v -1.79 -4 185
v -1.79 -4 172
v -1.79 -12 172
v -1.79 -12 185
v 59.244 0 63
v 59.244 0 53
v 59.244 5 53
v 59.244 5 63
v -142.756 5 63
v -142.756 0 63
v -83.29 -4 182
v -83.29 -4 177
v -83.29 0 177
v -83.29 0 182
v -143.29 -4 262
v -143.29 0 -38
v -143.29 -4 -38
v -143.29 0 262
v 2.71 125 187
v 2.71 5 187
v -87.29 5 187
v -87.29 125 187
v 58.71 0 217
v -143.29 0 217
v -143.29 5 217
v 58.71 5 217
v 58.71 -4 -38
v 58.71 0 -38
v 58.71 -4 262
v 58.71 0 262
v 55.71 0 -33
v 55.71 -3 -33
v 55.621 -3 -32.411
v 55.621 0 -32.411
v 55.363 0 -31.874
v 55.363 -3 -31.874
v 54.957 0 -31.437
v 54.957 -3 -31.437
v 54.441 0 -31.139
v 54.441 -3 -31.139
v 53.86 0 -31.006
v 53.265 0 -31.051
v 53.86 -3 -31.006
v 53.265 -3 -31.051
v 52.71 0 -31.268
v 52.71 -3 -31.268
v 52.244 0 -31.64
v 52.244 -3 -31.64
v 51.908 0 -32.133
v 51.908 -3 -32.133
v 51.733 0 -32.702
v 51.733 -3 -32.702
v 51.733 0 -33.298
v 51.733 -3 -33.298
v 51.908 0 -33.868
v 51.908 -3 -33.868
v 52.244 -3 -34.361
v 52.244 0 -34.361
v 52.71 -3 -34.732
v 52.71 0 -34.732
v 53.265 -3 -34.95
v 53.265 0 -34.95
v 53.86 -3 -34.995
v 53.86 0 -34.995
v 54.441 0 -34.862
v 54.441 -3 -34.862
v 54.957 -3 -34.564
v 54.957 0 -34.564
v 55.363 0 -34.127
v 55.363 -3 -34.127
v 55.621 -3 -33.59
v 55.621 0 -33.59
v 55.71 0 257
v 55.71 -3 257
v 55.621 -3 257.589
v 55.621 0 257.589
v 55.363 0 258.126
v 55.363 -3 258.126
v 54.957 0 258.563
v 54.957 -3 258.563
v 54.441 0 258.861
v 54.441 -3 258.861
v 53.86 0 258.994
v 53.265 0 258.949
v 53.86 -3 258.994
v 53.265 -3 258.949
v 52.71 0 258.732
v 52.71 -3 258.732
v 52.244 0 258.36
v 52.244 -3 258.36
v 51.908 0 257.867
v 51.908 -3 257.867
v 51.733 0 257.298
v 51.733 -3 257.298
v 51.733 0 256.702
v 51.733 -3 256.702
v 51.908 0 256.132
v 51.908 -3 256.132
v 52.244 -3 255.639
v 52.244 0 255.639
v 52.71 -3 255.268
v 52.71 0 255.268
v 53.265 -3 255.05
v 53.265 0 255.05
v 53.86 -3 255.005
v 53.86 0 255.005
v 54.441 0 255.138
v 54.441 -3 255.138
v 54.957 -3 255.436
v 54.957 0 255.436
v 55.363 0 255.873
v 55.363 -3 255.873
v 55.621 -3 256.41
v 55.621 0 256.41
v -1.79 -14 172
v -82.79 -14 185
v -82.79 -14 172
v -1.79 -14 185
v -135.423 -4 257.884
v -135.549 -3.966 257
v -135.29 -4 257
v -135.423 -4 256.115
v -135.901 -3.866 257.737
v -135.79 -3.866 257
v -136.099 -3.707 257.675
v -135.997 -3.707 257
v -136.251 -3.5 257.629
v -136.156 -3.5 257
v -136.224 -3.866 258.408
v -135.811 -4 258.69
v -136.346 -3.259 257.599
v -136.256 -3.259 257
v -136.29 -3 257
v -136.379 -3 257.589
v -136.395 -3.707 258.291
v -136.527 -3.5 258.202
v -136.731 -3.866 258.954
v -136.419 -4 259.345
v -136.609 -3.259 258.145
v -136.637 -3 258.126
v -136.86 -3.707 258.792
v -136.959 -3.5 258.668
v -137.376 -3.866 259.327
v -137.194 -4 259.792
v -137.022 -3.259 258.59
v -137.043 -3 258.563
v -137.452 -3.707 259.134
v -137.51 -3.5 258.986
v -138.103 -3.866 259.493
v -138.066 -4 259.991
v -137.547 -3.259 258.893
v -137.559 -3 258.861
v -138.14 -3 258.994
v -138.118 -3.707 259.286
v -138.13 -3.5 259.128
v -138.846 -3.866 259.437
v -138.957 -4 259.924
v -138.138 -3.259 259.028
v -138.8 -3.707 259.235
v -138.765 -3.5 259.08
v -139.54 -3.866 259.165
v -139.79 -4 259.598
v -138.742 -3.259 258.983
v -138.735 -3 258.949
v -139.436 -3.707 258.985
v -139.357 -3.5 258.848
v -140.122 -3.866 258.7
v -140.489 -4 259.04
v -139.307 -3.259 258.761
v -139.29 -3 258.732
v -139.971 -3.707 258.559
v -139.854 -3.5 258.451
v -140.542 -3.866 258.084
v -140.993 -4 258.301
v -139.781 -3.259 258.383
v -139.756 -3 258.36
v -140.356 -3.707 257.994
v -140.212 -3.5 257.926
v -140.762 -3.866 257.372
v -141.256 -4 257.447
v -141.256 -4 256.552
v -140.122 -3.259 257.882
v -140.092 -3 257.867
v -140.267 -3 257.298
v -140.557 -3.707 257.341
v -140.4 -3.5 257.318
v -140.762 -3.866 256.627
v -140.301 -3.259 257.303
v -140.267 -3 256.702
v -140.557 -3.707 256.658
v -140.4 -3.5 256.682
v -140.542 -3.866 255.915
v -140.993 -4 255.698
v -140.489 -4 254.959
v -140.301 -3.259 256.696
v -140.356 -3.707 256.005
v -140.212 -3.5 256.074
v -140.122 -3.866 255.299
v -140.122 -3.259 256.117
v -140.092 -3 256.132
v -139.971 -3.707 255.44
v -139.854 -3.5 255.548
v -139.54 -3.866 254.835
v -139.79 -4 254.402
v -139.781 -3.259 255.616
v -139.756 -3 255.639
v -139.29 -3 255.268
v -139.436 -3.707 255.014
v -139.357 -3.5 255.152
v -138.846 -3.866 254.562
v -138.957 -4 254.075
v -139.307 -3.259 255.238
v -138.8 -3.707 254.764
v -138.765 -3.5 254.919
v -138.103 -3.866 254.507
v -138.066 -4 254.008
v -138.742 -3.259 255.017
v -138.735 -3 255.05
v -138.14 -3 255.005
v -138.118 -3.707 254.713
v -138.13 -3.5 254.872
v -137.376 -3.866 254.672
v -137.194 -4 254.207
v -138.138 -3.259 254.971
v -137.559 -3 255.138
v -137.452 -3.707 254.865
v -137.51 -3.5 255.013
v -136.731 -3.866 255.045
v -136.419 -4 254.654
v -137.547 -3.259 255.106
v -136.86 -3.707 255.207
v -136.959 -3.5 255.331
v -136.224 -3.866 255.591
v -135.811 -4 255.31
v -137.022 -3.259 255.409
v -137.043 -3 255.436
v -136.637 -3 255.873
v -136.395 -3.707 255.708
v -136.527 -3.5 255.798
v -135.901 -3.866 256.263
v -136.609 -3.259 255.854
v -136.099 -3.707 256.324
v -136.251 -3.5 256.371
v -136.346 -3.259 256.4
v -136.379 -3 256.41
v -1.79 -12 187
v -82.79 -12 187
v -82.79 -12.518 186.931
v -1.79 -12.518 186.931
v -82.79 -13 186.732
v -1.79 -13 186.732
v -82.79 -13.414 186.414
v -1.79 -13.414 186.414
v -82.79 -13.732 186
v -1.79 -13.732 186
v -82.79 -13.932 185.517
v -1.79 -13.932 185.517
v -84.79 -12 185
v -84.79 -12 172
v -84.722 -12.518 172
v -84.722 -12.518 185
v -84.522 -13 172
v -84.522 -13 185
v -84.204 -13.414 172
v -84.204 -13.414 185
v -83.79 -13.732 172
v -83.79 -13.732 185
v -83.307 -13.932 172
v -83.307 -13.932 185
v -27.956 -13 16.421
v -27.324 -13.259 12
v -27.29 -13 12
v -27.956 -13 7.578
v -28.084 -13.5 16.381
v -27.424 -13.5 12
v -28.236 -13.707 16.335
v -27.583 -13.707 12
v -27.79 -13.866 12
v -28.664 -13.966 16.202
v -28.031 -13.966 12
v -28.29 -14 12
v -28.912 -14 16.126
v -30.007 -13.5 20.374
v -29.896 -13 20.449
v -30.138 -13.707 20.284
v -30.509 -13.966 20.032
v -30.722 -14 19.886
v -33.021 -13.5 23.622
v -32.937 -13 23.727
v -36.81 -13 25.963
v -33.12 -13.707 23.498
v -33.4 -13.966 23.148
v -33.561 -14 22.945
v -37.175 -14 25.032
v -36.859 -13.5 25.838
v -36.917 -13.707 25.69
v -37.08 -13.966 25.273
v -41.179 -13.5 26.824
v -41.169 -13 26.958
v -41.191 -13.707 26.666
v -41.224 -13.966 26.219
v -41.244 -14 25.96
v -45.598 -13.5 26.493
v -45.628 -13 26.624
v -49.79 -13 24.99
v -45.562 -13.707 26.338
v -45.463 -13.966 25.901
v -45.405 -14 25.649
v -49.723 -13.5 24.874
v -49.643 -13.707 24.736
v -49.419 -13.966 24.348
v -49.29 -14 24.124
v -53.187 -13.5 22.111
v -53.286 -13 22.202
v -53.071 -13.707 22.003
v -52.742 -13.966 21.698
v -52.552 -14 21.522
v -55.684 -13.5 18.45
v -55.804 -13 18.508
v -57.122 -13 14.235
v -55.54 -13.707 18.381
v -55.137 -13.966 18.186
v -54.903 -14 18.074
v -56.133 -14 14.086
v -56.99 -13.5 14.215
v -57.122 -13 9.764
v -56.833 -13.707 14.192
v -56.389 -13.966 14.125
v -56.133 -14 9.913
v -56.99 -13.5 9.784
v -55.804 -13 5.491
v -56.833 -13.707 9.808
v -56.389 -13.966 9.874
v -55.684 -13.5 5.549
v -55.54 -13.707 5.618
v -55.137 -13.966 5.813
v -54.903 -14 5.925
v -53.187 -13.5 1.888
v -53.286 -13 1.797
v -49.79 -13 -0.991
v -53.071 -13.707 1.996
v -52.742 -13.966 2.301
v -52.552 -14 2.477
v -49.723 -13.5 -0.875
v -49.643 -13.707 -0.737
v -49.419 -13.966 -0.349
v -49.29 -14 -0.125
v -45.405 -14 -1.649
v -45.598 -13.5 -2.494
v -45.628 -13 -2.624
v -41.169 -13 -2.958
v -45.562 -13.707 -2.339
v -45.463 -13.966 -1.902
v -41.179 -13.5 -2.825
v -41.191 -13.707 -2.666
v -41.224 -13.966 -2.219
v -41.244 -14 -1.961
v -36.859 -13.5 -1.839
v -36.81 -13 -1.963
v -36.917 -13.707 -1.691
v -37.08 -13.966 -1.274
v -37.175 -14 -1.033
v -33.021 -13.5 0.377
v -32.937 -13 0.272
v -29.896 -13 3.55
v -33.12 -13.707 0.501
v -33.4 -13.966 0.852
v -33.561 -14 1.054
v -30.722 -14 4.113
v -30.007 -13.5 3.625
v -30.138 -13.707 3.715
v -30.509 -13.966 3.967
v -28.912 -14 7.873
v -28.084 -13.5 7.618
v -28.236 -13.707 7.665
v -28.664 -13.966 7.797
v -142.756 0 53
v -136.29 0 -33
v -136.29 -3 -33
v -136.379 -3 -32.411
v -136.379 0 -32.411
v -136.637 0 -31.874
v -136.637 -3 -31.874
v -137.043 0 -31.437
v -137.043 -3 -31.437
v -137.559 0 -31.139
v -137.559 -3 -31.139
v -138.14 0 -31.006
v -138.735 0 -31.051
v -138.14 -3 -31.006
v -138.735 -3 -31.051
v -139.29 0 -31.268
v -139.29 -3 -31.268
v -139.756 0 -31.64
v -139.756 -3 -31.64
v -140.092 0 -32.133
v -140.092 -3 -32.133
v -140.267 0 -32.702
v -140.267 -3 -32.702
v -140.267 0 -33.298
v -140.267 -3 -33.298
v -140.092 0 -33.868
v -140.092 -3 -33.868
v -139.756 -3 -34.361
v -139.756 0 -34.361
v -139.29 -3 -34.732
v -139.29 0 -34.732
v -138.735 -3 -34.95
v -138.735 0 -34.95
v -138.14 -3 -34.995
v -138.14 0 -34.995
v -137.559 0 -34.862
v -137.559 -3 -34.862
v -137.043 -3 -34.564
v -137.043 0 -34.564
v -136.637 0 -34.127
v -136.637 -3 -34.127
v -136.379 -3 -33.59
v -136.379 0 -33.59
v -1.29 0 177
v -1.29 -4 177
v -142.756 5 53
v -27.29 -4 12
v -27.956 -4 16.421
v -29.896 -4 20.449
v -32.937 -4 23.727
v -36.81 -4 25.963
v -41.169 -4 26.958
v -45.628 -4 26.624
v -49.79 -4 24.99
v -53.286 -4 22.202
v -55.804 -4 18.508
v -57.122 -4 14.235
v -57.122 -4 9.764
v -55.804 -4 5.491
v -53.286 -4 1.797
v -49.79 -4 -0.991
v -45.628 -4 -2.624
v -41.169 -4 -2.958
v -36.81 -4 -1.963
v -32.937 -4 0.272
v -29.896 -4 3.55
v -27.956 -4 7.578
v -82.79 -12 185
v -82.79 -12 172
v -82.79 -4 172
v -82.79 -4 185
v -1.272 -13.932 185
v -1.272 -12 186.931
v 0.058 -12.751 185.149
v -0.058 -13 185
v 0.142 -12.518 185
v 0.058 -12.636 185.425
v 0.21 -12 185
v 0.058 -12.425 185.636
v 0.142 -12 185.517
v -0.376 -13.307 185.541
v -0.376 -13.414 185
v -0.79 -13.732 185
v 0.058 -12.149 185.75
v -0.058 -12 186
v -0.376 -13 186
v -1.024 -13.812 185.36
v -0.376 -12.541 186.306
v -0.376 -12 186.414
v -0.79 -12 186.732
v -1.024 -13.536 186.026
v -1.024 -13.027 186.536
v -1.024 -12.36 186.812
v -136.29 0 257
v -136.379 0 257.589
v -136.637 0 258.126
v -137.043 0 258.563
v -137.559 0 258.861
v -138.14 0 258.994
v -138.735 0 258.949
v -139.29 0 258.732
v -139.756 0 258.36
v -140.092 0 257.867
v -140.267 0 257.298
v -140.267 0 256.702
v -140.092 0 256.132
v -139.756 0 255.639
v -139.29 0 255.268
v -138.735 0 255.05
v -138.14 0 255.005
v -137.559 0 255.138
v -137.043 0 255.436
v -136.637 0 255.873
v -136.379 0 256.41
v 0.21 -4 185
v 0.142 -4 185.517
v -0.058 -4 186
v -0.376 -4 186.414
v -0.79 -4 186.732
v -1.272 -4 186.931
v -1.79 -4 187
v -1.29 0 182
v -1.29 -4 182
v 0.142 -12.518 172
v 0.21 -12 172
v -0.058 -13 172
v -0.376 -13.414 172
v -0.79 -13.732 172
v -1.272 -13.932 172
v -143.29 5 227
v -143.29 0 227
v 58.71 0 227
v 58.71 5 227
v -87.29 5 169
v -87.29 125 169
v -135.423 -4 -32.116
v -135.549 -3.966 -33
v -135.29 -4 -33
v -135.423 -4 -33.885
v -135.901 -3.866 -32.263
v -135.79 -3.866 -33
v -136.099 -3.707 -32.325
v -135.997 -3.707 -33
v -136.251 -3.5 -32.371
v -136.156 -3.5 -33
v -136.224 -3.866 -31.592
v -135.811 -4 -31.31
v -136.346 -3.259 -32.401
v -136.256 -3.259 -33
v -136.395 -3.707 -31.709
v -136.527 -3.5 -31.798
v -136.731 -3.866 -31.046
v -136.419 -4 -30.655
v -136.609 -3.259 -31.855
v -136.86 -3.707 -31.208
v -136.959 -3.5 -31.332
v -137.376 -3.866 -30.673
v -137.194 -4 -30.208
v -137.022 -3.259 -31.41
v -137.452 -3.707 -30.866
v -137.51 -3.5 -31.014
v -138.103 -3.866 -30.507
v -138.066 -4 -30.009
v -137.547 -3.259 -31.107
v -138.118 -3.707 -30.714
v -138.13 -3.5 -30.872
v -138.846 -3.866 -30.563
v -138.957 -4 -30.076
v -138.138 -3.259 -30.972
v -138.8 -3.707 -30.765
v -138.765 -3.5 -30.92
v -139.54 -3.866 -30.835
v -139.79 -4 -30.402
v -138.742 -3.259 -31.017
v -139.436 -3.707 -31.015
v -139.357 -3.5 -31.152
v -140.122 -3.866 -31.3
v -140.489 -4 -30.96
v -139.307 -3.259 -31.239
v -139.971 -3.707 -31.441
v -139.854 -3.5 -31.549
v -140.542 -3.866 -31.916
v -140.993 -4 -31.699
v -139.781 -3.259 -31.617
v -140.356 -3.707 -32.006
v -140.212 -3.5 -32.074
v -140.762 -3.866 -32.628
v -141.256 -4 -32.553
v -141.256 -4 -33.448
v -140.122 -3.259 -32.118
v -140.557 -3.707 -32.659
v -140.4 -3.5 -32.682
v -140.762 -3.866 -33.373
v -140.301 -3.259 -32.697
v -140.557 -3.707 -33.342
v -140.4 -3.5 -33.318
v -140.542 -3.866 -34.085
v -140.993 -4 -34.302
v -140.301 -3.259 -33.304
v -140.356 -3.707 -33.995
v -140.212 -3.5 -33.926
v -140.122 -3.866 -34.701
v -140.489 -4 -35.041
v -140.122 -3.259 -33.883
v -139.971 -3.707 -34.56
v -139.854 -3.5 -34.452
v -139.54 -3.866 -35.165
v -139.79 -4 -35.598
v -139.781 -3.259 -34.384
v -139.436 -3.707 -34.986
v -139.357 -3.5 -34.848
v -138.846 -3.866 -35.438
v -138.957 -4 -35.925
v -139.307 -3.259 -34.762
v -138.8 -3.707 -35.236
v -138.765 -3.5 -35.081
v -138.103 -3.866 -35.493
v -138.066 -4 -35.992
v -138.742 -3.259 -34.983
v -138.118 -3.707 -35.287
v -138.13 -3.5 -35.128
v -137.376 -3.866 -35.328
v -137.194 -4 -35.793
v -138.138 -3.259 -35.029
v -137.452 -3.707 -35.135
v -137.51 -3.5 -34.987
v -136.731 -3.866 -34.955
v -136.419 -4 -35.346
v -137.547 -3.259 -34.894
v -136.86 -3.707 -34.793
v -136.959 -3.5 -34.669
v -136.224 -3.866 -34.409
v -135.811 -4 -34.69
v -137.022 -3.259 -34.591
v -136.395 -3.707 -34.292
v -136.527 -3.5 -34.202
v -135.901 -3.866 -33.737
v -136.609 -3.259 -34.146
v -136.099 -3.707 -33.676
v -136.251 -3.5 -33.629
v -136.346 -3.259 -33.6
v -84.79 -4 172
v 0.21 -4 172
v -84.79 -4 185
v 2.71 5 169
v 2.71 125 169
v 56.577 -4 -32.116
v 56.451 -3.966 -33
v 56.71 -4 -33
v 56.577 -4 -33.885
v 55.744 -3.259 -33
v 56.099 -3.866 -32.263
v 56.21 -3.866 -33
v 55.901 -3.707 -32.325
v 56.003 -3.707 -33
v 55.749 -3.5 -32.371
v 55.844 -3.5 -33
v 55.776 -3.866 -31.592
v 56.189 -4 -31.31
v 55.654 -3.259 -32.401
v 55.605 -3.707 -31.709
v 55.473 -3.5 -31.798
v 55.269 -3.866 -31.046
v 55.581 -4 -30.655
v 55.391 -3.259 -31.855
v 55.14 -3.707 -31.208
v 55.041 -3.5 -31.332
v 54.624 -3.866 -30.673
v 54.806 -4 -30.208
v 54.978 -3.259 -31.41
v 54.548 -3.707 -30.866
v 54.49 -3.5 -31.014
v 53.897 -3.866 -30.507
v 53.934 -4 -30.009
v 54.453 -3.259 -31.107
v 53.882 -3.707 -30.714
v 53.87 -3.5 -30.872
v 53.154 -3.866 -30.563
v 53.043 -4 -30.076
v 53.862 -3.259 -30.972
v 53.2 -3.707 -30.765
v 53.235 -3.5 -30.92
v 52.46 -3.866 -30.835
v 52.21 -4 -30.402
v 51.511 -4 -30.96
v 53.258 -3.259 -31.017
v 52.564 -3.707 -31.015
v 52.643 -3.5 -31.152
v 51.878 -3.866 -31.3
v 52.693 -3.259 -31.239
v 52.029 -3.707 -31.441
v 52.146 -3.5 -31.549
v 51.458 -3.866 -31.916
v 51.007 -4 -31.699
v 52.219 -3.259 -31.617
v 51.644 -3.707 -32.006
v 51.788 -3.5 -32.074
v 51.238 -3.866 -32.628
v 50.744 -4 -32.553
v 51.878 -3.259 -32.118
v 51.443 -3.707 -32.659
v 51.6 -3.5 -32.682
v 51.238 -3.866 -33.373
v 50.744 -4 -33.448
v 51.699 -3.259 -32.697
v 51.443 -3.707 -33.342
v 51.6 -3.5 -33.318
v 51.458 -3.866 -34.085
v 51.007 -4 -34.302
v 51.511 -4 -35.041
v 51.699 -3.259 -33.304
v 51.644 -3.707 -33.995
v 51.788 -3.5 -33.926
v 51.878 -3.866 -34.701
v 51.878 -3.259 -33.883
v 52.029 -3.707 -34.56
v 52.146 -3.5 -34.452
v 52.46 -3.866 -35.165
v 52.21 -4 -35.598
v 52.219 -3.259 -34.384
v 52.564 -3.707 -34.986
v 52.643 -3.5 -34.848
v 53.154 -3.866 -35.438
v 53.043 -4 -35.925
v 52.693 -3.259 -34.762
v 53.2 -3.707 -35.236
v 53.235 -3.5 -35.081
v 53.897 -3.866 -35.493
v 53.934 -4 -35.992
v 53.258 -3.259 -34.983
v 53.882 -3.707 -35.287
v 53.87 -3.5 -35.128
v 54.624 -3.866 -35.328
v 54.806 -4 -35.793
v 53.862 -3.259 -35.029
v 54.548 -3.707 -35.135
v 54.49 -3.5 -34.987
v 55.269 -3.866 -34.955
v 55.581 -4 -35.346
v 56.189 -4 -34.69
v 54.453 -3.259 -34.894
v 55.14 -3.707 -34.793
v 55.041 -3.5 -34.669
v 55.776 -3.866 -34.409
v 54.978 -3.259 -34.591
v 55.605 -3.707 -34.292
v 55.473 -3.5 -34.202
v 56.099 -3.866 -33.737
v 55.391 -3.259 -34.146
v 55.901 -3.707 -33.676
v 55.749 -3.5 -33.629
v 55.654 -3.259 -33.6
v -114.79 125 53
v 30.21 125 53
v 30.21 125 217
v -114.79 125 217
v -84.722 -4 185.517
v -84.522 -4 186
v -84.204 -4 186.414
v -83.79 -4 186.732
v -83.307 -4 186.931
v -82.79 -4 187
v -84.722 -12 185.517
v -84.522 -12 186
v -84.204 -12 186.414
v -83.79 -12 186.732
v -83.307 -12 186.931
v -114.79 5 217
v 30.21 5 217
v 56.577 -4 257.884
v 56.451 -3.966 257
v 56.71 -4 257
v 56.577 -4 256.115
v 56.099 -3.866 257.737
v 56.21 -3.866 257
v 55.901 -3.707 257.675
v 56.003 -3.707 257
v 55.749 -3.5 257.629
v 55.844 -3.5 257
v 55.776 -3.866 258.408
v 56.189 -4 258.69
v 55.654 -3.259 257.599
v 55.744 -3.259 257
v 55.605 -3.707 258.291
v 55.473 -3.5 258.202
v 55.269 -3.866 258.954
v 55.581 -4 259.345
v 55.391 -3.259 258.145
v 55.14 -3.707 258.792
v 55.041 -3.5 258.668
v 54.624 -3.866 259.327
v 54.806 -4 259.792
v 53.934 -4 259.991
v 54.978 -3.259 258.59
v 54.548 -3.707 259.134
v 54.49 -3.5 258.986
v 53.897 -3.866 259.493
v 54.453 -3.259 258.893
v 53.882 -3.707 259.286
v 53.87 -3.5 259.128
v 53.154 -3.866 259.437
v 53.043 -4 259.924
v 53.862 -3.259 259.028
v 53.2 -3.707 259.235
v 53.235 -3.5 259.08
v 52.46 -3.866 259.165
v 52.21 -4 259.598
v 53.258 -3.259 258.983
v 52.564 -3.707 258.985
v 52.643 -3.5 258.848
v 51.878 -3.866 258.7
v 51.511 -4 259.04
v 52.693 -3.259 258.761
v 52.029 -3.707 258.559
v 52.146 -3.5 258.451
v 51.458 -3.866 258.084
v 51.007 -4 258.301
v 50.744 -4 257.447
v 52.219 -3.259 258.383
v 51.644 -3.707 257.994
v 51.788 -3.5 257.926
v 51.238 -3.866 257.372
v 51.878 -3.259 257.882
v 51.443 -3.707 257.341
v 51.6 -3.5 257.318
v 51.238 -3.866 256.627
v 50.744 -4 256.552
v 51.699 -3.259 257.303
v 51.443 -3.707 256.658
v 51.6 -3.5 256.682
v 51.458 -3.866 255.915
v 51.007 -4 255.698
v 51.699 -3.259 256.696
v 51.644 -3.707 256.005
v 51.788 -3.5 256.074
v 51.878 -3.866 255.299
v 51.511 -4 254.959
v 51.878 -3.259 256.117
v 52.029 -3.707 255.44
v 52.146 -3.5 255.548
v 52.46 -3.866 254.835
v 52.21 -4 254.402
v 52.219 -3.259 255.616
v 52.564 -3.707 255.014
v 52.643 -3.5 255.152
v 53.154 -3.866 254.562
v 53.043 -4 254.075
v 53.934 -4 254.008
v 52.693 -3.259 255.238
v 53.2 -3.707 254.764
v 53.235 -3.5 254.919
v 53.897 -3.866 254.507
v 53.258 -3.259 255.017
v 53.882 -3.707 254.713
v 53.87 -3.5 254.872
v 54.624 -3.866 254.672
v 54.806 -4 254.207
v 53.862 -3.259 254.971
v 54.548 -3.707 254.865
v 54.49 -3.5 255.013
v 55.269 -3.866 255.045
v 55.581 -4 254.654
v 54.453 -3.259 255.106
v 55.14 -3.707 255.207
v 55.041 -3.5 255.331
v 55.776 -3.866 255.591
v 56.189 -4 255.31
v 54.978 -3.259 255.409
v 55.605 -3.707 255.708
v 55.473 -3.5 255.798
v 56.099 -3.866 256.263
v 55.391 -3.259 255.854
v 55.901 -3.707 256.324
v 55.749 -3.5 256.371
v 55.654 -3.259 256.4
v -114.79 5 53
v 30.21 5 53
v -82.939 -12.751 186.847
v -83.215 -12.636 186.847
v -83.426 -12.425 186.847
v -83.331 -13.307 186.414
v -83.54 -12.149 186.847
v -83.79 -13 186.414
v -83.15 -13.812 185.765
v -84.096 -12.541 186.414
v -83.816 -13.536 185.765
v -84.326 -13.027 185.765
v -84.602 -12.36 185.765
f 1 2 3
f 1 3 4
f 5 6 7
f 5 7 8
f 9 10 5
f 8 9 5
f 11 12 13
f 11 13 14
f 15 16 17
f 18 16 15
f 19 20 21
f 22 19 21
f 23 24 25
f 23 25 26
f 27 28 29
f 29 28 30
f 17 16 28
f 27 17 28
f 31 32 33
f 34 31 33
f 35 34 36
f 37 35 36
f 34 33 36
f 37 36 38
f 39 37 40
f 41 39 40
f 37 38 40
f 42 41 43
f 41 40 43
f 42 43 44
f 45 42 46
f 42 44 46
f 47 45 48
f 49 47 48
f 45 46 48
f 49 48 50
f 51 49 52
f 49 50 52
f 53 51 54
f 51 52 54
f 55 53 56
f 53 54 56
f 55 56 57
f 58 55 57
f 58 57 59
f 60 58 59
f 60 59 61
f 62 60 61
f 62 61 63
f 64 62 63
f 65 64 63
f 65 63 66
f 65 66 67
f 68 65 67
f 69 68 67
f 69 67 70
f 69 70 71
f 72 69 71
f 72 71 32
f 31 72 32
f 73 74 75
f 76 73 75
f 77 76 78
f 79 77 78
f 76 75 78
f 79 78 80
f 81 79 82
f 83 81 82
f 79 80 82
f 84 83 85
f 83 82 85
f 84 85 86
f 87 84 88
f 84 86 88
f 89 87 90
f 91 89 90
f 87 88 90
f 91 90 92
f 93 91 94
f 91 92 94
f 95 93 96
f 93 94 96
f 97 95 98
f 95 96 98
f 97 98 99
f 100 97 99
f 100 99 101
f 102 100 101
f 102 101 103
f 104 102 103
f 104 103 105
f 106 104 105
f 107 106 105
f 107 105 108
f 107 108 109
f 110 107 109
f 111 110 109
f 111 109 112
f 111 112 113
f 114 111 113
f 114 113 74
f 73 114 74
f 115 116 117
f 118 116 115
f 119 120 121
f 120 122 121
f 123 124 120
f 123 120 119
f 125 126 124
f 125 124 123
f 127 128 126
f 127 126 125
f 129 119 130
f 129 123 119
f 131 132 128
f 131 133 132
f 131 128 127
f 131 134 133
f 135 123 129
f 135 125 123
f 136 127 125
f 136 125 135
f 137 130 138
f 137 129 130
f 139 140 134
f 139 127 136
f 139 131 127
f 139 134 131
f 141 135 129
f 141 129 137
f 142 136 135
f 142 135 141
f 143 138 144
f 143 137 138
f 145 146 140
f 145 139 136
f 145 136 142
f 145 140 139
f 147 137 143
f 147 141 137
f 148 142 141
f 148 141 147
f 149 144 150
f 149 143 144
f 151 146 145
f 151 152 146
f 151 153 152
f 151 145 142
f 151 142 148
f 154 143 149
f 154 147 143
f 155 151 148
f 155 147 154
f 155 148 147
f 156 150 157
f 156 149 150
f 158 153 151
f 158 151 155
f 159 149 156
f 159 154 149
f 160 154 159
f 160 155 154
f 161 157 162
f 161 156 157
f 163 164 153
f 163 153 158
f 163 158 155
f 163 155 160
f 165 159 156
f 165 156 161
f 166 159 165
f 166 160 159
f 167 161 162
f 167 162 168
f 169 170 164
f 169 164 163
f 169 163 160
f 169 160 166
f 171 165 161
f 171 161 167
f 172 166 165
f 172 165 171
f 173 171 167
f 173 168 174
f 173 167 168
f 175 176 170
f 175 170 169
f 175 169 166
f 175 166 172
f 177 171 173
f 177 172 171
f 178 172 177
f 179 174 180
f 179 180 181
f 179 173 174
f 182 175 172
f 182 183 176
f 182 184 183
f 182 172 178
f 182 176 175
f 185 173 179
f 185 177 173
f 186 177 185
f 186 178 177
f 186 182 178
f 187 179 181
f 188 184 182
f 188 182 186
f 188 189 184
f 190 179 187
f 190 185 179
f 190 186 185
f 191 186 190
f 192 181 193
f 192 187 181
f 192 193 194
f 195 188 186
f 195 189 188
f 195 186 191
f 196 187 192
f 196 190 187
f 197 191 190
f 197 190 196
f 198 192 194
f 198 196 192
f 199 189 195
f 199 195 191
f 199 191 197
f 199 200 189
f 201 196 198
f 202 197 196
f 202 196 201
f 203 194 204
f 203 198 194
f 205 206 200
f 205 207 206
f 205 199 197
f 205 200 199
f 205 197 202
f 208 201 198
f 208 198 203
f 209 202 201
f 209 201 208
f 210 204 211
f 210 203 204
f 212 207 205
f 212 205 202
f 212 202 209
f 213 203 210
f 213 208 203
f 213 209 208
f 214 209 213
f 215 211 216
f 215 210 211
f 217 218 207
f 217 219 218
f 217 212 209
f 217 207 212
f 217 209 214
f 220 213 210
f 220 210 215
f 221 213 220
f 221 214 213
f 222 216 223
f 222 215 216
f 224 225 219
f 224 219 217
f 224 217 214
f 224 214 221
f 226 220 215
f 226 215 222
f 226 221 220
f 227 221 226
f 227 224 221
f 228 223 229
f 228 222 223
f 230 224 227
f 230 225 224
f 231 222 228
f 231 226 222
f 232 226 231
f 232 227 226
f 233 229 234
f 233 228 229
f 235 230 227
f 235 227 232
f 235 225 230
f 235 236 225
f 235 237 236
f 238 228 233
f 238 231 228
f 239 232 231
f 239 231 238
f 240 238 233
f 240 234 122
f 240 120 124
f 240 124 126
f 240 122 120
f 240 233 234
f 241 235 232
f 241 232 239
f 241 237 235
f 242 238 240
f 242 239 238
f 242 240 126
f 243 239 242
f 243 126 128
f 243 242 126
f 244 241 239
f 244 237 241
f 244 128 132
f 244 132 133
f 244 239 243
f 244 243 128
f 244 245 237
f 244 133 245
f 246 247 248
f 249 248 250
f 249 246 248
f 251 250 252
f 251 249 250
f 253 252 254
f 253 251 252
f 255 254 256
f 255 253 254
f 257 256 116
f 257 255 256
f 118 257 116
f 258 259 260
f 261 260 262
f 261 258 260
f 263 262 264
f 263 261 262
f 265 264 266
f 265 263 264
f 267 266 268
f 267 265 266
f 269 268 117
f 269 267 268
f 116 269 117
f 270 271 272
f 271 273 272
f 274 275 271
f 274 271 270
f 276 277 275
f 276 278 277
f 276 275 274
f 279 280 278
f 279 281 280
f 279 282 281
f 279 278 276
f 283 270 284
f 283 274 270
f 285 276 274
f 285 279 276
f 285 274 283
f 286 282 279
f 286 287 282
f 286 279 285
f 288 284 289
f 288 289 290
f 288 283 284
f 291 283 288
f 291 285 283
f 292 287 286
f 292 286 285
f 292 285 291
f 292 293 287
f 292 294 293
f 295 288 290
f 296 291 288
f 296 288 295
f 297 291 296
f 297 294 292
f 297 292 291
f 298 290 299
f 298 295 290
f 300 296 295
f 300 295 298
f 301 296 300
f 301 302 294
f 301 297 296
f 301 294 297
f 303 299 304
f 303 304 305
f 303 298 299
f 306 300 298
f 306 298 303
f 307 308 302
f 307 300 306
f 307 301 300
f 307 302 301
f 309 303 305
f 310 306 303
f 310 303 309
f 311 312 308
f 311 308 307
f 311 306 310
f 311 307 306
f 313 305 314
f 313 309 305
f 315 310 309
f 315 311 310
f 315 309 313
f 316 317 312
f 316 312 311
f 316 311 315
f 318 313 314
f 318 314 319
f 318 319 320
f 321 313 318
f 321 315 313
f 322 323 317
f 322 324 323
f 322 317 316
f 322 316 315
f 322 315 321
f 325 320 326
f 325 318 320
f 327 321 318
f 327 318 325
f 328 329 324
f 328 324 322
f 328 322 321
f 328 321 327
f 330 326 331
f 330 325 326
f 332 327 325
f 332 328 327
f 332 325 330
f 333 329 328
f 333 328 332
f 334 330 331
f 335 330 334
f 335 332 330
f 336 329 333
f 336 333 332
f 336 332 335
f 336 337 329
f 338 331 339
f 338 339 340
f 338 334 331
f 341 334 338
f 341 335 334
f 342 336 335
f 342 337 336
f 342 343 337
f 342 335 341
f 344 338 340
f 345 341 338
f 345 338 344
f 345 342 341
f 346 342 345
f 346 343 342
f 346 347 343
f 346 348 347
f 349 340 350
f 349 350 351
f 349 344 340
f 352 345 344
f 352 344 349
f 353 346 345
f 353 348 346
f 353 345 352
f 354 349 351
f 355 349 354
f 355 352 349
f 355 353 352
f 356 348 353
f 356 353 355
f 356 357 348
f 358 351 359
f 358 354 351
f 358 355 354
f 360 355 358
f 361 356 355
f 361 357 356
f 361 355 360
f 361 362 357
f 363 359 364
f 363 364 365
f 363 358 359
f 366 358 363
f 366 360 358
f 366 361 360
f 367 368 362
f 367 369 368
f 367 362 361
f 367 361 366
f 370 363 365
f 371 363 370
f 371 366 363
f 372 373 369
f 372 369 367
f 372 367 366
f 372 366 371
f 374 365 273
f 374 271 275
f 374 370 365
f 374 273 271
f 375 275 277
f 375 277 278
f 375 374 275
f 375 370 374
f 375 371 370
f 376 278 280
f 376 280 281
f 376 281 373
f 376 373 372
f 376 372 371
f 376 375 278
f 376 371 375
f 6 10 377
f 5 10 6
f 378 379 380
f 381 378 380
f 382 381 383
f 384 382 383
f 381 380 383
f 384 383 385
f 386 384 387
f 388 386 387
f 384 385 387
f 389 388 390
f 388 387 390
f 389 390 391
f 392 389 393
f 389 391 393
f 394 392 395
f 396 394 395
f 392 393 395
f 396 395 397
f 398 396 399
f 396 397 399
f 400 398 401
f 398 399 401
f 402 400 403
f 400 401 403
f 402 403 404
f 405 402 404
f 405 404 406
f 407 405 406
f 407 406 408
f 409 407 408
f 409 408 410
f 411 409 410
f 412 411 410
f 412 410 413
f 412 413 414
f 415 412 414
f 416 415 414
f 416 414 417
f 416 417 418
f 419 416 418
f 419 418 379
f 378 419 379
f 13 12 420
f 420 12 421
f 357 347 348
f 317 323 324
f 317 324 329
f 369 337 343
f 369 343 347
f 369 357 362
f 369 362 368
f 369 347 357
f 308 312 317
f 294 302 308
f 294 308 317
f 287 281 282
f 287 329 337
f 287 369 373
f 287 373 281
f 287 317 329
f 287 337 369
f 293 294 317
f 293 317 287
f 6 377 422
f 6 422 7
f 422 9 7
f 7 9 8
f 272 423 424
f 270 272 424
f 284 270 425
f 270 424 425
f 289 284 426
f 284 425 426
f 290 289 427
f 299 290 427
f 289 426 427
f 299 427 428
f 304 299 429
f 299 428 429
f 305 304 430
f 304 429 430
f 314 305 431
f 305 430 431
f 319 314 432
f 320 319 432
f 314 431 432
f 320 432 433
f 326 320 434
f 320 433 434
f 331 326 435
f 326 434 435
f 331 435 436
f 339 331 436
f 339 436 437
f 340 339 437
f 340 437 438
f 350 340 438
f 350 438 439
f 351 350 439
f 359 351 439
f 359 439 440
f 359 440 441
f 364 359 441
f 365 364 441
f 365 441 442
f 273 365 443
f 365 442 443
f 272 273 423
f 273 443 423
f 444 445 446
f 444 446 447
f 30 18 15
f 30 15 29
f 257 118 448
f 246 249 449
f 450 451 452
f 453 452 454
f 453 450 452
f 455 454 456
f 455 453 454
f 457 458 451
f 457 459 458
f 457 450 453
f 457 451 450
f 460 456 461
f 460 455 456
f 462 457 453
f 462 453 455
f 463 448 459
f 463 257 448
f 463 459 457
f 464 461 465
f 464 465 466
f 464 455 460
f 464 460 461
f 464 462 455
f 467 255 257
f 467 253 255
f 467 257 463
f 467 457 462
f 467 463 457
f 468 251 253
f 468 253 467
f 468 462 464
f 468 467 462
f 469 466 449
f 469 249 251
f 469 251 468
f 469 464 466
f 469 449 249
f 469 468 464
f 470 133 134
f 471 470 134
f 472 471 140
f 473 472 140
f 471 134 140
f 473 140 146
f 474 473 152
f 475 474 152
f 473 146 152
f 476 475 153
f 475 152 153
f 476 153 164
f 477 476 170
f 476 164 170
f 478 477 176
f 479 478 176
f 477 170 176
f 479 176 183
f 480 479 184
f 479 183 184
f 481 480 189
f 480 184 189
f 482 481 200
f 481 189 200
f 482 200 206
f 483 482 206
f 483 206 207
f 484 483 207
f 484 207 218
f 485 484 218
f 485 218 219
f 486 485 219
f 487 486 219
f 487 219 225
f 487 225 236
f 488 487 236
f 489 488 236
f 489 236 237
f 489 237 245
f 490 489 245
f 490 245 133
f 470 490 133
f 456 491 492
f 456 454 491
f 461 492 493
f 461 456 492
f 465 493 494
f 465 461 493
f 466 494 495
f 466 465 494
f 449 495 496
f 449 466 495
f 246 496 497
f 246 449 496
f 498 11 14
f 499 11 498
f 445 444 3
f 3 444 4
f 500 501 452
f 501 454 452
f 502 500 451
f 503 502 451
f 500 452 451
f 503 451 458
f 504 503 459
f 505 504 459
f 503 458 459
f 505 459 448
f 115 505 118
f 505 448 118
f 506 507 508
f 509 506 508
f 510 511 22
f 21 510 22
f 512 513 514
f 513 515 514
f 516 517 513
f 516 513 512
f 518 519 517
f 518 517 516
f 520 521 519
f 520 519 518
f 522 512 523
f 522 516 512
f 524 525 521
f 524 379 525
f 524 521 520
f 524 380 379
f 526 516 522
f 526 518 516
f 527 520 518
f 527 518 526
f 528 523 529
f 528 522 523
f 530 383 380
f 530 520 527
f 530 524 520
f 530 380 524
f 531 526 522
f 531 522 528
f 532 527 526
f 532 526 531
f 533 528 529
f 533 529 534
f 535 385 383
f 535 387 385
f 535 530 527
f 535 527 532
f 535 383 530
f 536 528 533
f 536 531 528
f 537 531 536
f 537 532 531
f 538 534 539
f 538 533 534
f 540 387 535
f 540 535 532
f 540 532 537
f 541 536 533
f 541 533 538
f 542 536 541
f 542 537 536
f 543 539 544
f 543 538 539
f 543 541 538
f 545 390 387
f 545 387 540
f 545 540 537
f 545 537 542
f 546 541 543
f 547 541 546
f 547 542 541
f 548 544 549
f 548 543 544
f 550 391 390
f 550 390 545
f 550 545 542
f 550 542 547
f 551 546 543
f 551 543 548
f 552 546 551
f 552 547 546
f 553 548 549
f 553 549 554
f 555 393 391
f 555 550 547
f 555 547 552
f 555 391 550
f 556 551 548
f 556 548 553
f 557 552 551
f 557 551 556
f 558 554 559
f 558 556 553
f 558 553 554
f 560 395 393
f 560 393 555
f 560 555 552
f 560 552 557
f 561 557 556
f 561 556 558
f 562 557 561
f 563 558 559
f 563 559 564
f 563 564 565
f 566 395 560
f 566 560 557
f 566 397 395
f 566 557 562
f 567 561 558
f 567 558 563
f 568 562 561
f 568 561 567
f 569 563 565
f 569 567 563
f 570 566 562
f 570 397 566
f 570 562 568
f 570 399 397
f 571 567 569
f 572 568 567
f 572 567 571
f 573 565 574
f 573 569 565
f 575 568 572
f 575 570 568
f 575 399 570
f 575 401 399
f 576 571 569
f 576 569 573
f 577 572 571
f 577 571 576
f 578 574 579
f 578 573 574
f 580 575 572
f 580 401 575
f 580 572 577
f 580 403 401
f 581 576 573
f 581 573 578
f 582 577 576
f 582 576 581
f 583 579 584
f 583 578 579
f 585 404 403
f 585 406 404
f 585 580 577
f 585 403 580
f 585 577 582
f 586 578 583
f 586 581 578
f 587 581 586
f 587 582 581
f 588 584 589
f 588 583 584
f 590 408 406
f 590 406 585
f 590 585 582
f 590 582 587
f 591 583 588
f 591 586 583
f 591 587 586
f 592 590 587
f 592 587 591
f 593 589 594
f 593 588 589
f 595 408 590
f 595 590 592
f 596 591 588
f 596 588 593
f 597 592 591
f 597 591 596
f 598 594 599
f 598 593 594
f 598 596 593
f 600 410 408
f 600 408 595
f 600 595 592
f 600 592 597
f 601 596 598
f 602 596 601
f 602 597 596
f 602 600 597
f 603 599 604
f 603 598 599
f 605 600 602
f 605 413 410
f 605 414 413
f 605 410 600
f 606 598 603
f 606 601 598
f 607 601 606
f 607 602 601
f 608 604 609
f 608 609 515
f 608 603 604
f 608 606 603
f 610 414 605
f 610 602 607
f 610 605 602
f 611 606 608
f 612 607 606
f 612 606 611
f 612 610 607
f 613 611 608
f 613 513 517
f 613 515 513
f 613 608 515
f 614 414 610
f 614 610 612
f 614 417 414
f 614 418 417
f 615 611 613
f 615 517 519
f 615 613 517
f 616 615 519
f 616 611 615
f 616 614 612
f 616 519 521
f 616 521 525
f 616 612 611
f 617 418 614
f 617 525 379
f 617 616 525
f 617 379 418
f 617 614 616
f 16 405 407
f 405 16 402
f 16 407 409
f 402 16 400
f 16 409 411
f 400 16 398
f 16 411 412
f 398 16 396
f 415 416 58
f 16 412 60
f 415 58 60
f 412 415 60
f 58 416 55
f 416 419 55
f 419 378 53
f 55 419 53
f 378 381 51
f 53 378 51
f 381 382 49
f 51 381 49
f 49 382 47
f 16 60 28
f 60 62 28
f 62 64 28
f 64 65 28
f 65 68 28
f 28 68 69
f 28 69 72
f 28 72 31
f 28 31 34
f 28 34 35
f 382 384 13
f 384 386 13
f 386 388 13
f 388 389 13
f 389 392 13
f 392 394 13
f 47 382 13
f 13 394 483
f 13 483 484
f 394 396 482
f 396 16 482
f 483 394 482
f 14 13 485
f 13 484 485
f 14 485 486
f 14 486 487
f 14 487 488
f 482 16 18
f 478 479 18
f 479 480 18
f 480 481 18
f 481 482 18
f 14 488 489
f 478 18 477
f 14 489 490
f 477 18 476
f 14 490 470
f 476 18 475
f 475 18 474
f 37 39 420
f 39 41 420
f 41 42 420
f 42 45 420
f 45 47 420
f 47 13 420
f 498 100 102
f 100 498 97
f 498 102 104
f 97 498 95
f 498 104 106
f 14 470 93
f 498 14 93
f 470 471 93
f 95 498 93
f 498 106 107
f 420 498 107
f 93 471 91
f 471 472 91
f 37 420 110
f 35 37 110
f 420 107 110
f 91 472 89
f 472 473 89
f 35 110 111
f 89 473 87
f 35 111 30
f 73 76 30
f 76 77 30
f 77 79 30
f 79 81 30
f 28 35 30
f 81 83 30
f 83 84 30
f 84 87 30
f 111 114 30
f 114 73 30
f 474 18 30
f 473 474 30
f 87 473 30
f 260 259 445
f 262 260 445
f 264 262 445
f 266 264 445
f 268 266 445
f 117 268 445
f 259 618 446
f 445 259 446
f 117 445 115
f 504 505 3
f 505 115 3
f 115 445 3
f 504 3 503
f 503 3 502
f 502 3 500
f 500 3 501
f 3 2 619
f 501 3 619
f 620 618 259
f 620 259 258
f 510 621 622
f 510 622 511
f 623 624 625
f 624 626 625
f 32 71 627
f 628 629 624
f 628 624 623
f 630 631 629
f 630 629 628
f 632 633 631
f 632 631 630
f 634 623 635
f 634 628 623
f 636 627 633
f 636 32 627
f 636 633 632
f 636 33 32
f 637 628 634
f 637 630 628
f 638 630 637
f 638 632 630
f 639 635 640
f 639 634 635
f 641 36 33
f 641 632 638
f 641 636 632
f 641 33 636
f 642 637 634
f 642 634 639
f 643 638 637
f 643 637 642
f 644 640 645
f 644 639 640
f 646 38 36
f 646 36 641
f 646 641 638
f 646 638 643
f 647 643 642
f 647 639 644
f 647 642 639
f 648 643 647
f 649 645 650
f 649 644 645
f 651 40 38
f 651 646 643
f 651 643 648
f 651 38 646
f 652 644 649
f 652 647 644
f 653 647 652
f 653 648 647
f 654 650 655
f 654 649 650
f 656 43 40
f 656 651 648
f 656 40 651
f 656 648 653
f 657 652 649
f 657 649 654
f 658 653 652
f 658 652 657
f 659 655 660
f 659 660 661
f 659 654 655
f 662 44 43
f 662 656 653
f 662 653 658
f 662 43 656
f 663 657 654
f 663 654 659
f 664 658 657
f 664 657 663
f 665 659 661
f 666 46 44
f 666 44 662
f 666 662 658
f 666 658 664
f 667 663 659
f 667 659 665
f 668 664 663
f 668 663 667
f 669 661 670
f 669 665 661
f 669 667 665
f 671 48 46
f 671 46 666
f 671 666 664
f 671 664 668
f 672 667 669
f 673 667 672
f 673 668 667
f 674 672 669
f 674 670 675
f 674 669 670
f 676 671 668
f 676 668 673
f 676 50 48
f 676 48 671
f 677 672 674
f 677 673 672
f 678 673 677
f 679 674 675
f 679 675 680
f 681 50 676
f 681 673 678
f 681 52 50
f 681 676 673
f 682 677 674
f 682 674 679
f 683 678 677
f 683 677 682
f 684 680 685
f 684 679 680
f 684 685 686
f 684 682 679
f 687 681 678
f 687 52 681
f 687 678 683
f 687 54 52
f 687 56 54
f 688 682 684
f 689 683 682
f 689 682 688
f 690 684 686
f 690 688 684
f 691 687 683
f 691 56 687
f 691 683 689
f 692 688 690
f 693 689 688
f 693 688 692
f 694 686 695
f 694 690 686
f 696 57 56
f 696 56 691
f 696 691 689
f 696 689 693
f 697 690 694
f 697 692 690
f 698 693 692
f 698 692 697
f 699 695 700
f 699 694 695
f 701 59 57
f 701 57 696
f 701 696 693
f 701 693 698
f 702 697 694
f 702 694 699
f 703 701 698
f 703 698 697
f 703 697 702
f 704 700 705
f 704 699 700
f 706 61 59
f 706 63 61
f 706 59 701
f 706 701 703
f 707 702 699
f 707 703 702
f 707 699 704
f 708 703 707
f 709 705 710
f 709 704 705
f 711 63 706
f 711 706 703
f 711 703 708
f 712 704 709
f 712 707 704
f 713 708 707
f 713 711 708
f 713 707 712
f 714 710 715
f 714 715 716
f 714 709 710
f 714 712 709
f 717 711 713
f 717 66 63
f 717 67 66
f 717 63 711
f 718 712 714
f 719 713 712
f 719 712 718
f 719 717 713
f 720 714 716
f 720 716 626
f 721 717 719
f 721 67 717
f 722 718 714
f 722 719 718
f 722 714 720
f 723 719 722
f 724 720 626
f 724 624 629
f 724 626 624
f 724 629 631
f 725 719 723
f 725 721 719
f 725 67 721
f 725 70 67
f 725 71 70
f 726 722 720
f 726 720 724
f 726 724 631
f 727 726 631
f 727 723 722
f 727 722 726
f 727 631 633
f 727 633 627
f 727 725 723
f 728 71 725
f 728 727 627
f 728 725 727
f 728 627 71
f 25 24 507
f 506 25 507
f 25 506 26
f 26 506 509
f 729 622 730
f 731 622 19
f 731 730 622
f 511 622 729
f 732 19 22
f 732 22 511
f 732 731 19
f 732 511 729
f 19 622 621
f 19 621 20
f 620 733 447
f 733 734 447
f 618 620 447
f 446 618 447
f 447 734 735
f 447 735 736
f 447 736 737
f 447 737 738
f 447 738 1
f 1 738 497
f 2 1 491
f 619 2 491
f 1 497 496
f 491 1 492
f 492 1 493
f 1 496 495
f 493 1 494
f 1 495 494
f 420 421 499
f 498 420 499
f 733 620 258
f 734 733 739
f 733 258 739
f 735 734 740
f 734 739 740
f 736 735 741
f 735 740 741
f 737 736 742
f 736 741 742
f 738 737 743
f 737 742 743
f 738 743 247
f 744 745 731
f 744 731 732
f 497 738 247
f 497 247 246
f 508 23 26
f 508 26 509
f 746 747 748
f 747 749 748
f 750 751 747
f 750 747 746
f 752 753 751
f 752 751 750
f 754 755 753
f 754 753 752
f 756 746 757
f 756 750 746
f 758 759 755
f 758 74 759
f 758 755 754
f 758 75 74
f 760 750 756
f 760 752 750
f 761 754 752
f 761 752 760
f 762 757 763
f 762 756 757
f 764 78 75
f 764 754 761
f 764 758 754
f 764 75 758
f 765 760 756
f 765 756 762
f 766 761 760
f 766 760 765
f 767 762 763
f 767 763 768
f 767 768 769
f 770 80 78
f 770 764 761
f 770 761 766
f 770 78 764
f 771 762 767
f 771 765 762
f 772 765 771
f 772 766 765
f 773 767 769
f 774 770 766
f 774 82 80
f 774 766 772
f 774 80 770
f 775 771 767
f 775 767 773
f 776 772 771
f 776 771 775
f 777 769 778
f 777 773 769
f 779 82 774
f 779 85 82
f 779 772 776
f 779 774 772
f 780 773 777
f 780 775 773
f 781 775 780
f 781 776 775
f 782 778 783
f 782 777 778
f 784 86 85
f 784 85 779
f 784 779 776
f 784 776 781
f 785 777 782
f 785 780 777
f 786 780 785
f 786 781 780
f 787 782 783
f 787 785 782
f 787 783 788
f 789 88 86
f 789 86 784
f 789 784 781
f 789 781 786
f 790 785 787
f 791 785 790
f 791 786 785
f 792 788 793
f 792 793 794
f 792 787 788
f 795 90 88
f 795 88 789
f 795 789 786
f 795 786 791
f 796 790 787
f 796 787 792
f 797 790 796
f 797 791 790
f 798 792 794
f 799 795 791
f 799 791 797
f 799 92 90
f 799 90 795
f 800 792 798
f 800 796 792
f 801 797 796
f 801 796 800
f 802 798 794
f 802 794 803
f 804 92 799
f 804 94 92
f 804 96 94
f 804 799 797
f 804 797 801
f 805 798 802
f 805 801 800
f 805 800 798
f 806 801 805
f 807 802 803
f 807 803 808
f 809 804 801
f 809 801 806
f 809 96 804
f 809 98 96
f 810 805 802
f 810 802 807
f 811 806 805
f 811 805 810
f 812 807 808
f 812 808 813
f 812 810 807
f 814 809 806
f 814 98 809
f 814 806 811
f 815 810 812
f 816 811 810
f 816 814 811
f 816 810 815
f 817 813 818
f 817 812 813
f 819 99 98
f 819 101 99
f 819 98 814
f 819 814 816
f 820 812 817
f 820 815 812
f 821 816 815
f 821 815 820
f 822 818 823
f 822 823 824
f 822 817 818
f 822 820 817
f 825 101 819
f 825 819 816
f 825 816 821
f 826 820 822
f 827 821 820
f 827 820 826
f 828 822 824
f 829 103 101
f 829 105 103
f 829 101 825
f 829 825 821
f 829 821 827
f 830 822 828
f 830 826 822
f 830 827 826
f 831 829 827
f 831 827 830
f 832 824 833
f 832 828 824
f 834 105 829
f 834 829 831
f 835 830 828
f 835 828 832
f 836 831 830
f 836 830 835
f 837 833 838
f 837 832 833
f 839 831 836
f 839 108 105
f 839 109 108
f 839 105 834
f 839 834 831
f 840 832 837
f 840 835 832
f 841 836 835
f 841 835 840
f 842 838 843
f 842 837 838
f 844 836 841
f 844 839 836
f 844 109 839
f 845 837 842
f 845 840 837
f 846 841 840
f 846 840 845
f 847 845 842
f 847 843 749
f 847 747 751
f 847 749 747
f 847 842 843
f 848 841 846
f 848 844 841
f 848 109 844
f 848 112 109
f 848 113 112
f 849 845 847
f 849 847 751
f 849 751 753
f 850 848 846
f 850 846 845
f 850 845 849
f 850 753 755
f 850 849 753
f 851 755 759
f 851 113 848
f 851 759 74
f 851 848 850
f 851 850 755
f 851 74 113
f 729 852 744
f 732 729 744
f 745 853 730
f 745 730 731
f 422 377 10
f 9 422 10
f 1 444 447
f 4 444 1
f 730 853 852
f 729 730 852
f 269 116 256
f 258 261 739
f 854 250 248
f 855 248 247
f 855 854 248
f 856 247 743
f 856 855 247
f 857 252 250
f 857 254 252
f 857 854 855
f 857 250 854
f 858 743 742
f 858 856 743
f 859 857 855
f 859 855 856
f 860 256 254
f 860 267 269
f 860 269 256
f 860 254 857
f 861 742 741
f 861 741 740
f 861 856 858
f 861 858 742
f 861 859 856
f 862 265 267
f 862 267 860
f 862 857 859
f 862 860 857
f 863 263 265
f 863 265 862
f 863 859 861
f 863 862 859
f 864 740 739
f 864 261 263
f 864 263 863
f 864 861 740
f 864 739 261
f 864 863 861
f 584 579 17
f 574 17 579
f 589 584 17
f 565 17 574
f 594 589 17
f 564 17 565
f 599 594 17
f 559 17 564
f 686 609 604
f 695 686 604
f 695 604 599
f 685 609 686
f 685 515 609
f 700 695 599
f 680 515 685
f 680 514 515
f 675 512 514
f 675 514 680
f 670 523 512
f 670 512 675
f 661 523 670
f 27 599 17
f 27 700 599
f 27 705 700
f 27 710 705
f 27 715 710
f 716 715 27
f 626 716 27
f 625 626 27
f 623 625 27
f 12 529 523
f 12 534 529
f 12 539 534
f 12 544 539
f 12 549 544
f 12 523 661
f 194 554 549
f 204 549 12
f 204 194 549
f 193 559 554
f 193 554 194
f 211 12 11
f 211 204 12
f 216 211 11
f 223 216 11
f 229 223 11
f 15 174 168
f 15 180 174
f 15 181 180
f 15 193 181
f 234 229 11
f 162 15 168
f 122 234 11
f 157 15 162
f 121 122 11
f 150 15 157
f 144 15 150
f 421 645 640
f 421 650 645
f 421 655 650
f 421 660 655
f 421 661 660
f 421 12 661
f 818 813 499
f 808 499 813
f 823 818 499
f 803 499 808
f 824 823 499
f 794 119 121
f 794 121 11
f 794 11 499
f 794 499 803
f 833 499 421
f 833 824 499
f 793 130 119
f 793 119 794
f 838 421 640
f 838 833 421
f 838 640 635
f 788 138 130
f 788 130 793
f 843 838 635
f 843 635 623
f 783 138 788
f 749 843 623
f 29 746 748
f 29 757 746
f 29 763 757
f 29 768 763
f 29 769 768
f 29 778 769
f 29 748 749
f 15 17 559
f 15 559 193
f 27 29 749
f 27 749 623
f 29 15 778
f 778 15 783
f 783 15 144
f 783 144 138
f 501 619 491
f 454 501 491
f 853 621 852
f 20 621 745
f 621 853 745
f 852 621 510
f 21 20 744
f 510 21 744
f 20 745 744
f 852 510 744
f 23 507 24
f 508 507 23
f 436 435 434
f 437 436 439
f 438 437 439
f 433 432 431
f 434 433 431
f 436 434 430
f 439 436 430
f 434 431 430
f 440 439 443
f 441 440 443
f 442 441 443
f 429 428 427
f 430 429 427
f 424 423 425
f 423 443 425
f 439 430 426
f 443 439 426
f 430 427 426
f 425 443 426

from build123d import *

# Parameters (mm, degrees)
F0_W      = 202
F0_H      = 300
F1_DEPTH  = 4
F2_R      = 2
F3_DEPTH  = 5
F4_R      = 15
F5_DEPTH  = 10
F6_R      = 1
F7_W      = 85
F7_H      = 15
F8_DEPTH  = 10
F9_R      = 2
F10_T     = 2
F11_W     = 81
F11_H     = 13
F12_DEPTH = 10
F2_W      = 82
F2_H      = 5
F13_DEPTH = 25
F14_R     = 1
F15_W     = 202
F15_H     = 10
F16_DEPTH = 5
F17_W     = 145
F17_H     = 164
F17_W_2   = 90
F17_H_2   = 18
F18_DEPTH = 120


# Not quite as in the source:
# - a shell that OpenCascade refuses in one call is made with other operations: the cavity is built on its own and cut out
# - a feature names something its author has since deleted; it is built from what else it names


with BuildPart() as f1:
    # F0 (on Front) → F1 (new body)
    with BuildSketch(Plane.XZ):
        with Locations((-42.2897736542, 111.9996137917)):
            Rectangle(F0_W, F0_H)
    extrude(amount=F1_DEPTH)

    # F2 (on face) → F3 (cut)
    with BuildSketch(Plane.XZ.offset(4)):
        with Locations((-138.2897736542, -33.0003862083)):
            Circle(F2_R)
        with Locations((-138.2897736542, 256.9996137917)):
            Circle(F2_R)
        with Locations((53.7102263458, 256.9996137917)):
            Circle(F2_R)
        with Locations((53.7102263458, -33.0003862083)):
            Circle(F2_R)
    extrude(amount=-F3_DEPTH, mode=Mode.SUBTRACT)

    # F2 (on face) → F13 (cut)
    with BuildSketch(Plane.XZ.offset(4)):
        with Locations((-42.2897736542, 179.4996137917)):
            Rectangle(F2_W, F2_H)
    extrude(amount=-F13_DEPTH, mode=Mode.SUBTRACT)

    # F14
    f14_edges = [f1.edges().sort_by_distance(p)[0] for p in [
        (-140.289774, -4, 256.999614),
        (-140.289774, -4, -33.000386),
        (51.710226, -4, -33.000386),
        (51.710226, -4, 256.999614),
    ]]
    fillet(f14_edges, radius=F14_R)


with BuildPart() as f5:
    # F4 (on face) → F5 (new body)
    with BuildSketch(Plane.XZ.offset(4)):
        with Locations((-42.2897736542, 11.9996137917)):
            Circle(F4_R)
    extrude(amount=F5_DEPTH)

    # F6
    f6_edges = [f5.edges().sort_by_distance(p)[0] for p in [
        (-57.289774, -14, 11.999614),
    ]]
    fillet(f6_edges, radius=F6_R)


with BuildPart() as f8:
    # F7 (on face) → F8 (new body)
    with BuildSketch(Plane.XZ.offset(4)):
        with Locations((-42.2897736542, 179.4996137917)):
            Rectangle(F7_W, F7_H)
    extrude(amount=F8_DEPTH)

    # F9
    f9_edges = [f8.edges().sort_by_distance(p)[0] for p in [
        (-84.789774, -14, 179.499614),
        (-42.289774, -14, 186.999614),
        (0.210226, -14, 179.499614),
        (0.210226, -9, 186.999614),
        (-84.789774, -9, 186.999614),
    ]]
    fillet(f9_edges, radius=F9_R)

    # F10: shell of thickness 2, made by hand


with BuildPart() as f10_core1:
    # F10_t2: copy of F8
    add(f8.part)

    # the walls: a layer under each face that stays
    f10_faces = [f10_core1.faces().sort_by_distance(p)[0] for p in [
        (-42.2897736542, -8, 186.9996137917),
        (-42.2897736542, -4, 179.4996137917),
        (0.2102263458, -8, 178.4996137917),
        (-84.7897736542, -8, 178.4996137917),
        (-42.2897736542, -14, 178.4996137917),
    ]]
    thicken(f10_faces, amount=-F10_T, mode=Mode.SUBTRACT)


with BuildPart() as f8_1:
    add(f8.part)

    # what is left inside the walls is the cavity
    f10_cavity = [f10_core1.part.solids().sort_by_distance(p)[0] for p in [
        (-42.289774, -6.02, 176.332947),
    ]]
    add(f10_cavity, mode=Mode.SUBTRACT)

    # F11 (on face) → F12 (cut)
    with BuildSketch(Plane.XZ.offset(6)):
        with Locations((-42.2897736542, 178.4996137917)):
            Rectangle(F11_W, F11_H)
    extrude(amount=-F12_DEPTH, mode=Mode.SUBTRACT)


with BuildPart() as f16:
    # F15 (on face) → F16 (new body)
    with BuildSketch(Plane.XZ):
        with Locations((-42.2897736542, 221.9996137917)):
            Rectangle(F15_W, F15_H)
    extrude(amount=-F16_DEPTH)


with BuildPart() as f16b:
    # F15 (on face) → F16, piece 2 (new body)
    with BuildSketch(Plane.XZ):
        with Locations((-41.7558064461, 57.9996137917)):
            Rectangle(F15_W, F15_H)
    extrude(amount=-F16_DEPTH)


with BuildPart() as f18:
    # F17 (on face) → F18 (new body)
    with BuildSketch(Plane(origin=(0, 5, 0), x_dir=(-1, 0, 0), z_dir=(0, 1, 0))):
        with Locations((42.2897736542, 134.9996137917)):
            Rectangle(F17_W, F17_H)
        with Locations((42.2897736542, 177.9996137917)):
            Rectangle(F17_W_2, F17_H_2, mode=Mode.SUBTRACT)
    extrude(amount=F18_DEPTH)


solid = Compound([f1.part, f5.part, f8_1.part, f16.part, f16b.part, f18.part])
